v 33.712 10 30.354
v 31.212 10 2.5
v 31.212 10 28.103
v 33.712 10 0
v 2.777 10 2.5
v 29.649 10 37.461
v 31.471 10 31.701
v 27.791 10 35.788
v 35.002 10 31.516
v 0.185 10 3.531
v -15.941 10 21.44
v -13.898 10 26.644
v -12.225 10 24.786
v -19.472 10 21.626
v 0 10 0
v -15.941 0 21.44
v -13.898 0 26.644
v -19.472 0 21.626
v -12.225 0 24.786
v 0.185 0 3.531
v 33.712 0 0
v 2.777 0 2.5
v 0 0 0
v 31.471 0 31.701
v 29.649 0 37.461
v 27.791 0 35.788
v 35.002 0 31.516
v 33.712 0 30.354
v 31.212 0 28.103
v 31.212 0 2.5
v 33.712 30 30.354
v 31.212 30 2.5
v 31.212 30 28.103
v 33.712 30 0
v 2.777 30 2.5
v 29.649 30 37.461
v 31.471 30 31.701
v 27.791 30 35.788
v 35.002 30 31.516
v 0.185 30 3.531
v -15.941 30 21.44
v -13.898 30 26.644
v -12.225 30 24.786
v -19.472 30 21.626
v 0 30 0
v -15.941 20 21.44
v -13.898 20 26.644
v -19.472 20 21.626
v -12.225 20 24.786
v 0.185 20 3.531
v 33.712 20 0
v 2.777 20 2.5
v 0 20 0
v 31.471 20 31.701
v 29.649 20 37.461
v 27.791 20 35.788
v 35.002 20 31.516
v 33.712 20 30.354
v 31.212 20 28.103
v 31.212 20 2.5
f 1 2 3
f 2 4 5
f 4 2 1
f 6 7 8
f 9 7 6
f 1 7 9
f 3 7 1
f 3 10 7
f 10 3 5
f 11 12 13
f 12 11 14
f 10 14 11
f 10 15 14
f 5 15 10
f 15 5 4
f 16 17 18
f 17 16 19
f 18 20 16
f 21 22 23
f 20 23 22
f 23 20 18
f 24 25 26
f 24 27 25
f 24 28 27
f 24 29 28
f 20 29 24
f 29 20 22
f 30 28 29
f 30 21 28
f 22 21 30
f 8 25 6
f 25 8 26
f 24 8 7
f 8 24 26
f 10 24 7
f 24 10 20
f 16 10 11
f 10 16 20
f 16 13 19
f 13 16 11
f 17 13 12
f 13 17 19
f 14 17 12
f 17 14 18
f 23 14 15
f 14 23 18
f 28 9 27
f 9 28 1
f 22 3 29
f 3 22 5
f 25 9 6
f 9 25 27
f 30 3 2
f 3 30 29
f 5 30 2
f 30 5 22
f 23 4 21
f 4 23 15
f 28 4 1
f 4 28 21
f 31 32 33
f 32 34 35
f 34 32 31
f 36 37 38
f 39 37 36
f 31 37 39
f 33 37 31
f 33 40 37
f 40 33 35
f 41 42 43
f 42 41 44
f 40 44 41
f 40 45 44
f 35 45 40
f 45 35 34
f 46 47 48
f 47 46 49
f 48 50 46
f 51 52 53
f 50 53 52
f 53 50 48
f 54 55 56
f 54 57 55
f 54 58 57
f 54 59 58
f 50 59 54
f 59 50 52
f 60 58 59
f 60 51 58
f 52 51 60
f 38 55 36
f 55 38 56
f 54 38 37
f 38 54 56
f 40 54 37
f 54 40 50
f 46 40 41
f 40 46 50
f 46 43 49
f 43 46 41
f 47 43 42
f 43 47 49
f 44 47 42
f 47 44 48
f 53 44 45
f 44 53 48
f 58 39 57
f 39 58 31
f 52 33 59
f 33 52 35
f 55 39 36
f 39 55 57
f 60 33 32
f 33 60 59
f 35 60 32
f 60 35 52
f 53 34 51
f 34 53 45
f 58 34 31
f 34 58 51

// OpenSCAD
// file: Parts/Screw.scad
// created by IndiePandaaaaa | Lukas

$fn=50;

function cone_diameter(diameter)=diameter * 2;

function cone_diameter_cutout(diameter)=diameter * 2 + 0.5;

function cone_height(diameter)=diameter * 0.75;

module screw(diameter, length=12, cutout_sample=false) {
  module base_model(diameter, length, cone_height, cone_diameter, offset=0) {
    rotate_extrude() {
      polygon([
          [0, 0],
          [(diameter + offset) / 2, 0],
          [(diameter + offset) / 2, (length + offset) - (cone_height + offset)],
          [(cone_diameter + offset) / 2, length + offset],
          [0, length + offset],
        ]);
    }
  }

  if (length < diameter) {
    echo("Screw is too short");
    length=diameter + 5;
    echo("New length is: ", length);
  }

  if (!cutout_sample) {
    translate([0, 0, -length])
      difference() {
        base_model(diameter, length, cone_height(diameter), cone_diameter(diameter));

        // top cross part
        translate([0, 0, length - (cone_height(diameter) - diameter / 2) + .1])
          difference() {
            rotate([0, 0, 45])
              rotate_extrude() {
                polygon([
                    [0, 0],
                    [diameter * 1.4 / 2, 0],
                    [cone_diameter(diameter) / 3, cone_height(diameter) - diameter / 2],
                    [0, cone_height(diameter) - diameter / 2],
                  ]);
              }
            for (i=[0 : 1 : 3]) {
              rotate([0, 0, 90 * i])
                translate([diameter / 3.18 / 2, diameter / 3.18 / 2, 0]) cube(cone_height(diameter));
            }
          }
      }
  } else {
    offset=0;
    diameter=cone_diameter_cutout(diameter) / 2;  // is duplicated by function, used to reduce error
    translate([0, 0, -length - offset / 2]) {
      base_model(diameter, length, cone_height(diameter), cone_diameter(diameter), offset);
      translate([0, 0, length -.005]) cylinder(r=diameter, h=50);
    }
  }
}

module screw_corehole(diameter_screw, diameter_core, unthreaded_length, length=12) {
  union() {
    screw(diameter=diameter_screw, length=unthreaded_length, cutout_sample=true);
    translate([0, 0, -length]) cylinder(d=diameter_core, h=length - unthreaded_length + .1);
  }
}

module screw_with_nut(screw_length, diameter, square_channel=false, tolerance=.1) {
  function od(width) = ((width/2) / cos(30)) * 2; // calculates nut diameter from given width
  nut_thickness=[0.8, 1.6, 2.4, 3.2, 4, 5, 5.5, 6.5];
  nut_width=[2.5, 4, 5.5, 7.1, 8.1, 10.1, 11.1, 13.1];

  if (!(0 < diameter && diameter <= 8 && diameter == round(diameter))) {
    echo("module is only defined for integer values from M1 to M8.");
  } else {
    union() {
      if (!square_channel) {
        screw(diameter=diameter, length=screw_length, cutout_sample=true);

        translate([0, 0, -(screw_length*2 - nut_thickness[diameter - 1])]) 
          cylinder(d=od(nut_width[diameter - 1]) + tolerance, h=screw_length, $fn=6);

      } else {
        screw(diameter=diameter, length=screw_length + diameter, cutout_sample=true);
        translate([-od(nut_width[diameter - 1])/2 - tolerance, -(nut_width[diameter - 1]/2), -(screw_length)]) 
          cube([od(nut_width[diameter - 1]) + screw_length, nut_width[diameter - 1] + tolerance, nut_thickness[diameter - 1] + tolerance]);
      }
    }
  }
}

translate([ 0, 0, 0]) screw(diameter=3.5, length=12, cutout_sample=false);
translate([20, 0, 0]) screw_corehole(diameter_screw=3, diameter_core=2.5, unthreaded_length=15, length=20);
translate([40, 0, 0]) screw_with_nut(screw_length=30, diameter=4, square_channel=false, tolerance=.1);
// main file
// created by IndiePandaaaaa|Lukas
// encoding: utf-8

use <Parts/Screw.scad>

TOLERANCE = .1;
THICKNESS = 2.5;
$fn = $preview ? 25:125;

// width of stand, depth, height, bracket width, distance inbetween brackets
DEVICE_SIZE = [32, 42, 24, 10, 20];
DEVICE_ANGLE = 42;

// depth, height; [0, 0] for no standoff
STANDOFF_SIZE = [0, 0];

// short version to add TOLERANCE to values
function t(value) = value + TOLERANCE;

module device_bracket(depth=5) {
  back_height = 3;
  front_depth = 5;
  translate([0, depth, 0]) rotate([90, 0, 0]) linear_extrude(depth) {
    polygon([
      [0, 0],
      [t(DEVICE_SIZE[1]) + THICKNESS*2, 0],
      [t(DEVICE_SIZE[1]) + THICKNESS*2, back_height + THICKNESS*2],
      [t(DEVICE_SIZE[1]) + THICKNESS, back_height + THICKNESS*2],
      [t(DEVICE_SIZE[1]) + THICKNESS, THICKNESS],
      [THICKNESS, THICKNESS],
      [THICKNESS, t(DEVICE_SIZE[2]) + THICKNESS],
      [THICKNESS + front_depth, t(DEVICE_SIZE[2]) + THICKNESS],
      [THICKNESS + front_depth, t(DEVICE_SIZE[2]) + THICKNESS*2],
      [0, t(DEVICE_SIZE[2]) + THICKNESS*2],
    ]);
  }
}

function standoff_length() = cos(DEVICE_ANGLE)*DEVICE_SIZE[1];

function standoff_height() = sin(DEVICE_ANGLE)*DEVICE_SIZE[1];

module standoff_base(depth=5) {
  length = standoff_length();
  height = standoff_height();

  translate([0, depth, 0]) rotate([90, 0, 0]) linear_extrude(depth) {
    polygon([
      [0, 0],
      [length + THICKNESS, 0],
      [length + THICKNESS, standoff_height() + tan(DEVICE_ANGLE)*THICKNESS + TOLERANCE],
      [length, standoff_height() + TOLERANCE],
      [length, THICKNESS],
      [0, THICKNESS],
    ]);
  }
}

union() {
  for (i=[0:1]) {
    translate([0, DEVICE_SIZE[4]*i, 0]) {
      translate([0, 0, STANDOFF_SIZE[1]]) rotate([0, -DEVICE_ANGLE, 0]) device_bracket(DEVICE_SIZE[3]);
      standoff_base(DEVICE_SIZE[3]);
    }
  }
}
